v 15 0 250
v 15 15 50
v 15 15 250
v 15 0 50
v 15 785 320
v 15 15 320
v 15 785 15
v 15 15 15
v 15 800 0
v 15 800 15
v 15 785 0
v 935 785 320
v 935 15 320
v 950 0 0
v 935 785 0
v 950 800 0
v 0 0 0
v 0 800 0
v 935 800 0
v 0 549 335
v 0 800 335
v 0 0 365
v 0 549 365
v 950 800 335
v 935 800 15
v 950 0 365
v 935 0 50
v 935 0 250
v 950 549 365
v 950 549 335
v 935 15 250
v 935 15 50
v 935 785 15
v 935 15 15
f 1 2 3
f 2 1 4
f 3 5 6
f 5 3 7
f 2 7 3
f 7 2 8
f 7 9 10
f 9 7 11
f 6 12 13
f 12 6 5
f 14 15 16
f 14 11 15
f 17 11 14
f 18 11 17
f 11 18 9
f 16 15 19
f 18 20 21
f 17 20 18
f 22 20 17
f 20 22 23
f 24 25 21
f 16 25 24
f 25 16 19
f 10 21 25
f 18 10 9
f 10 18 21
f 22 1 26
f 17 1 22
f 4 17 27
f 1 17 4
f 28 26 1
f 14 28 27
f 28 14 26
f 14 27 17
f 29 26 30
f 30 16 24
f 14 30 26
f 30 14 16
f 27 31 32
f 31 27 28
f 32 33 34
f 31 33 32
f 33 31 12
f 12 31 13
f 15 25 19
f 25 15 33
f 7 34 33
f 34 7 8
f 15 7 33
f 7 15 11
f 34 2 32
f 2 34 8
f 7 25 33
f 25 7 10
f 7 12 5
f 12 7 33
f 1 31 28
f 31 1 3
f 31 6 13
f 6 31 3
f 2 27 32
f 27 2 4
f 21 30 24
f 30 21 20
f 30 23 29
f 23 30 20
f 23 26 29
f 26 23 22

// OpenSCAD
// Duster II Sleep Pack clone — v0.1 visualization
// Open in OpenSCAD. Set unfolded = true to see the bed deployed.
// Numbers match cad/params.py — if you change params.py, update these.

unfolded = false;

ply = 15;
box_w = 950;
box_d = 800;
box_h = 320;
inner_w = box_w - 2 * ply;
inner_d = box_d - 2 * ply;
inner_h = box_h - ply;
rail_top_h = 70;
rail_bot_h = 50;
table_w = inner_w - 2;
table_h = box_h - rail_top_h - rail_bot_h - 2;

p1 = 800;
p2 = 549;
p3 = 549;
deck_gap = 2;
bed_w = 950;
wing = 175;
wing_len = p2;
frame_rail_h = 80;
leg_h = inner_h;

module ply_xy(w, d) {
    cube([w, d, ply]);
}

module box() {
    // sides
    cube([ply, box_d, box_h]);
    translate([box_w - ply, 0, 0]) cube([ply, box_d, box_h]);
    // bottom
    translate([ply, ply, 0]) cube([inner_w, inner_d, ply]);
    // front (cabin)
    translate([ply, box_d - ply, ply]) cube([inner_w, ply, inner_h]);
    // rear rails
    translate([ply, 0, box_h - rail_top_h]) cube([inner_w, ply, rail_top_h]);
    translate([ply, 0, 0]) cube([inner_w, ply, rail_bot_h]);
}

module table_flap() {
    color("#c9b48a")
    translate([ply + 1, -table_h, rail_bot_h + 1])
        cube([table_w, ply, table_h]);
}

module deck_folded() {
    color("#c9b48a") {
        translate([0, 0, box_h]) ply_xy(bed_w, p1);
        translate([0, 0, box_h + ply]) ply_xy(bed_w, p2);
        translate([0, 0, box_h + 2 * ply]) ply_xy(bed_w, p3);
    }
}

module deck_open() {
    color("#c9b48a") {
        translate([0, 0, box_h]) ply_xy(bed_w, p1);
        translate([0, p1 + deck_gap, box_h]) ply_xy(bed_w, p2);
        translate([0, p1 + p2 + 2 * deck_gap, box_h]) ply_xy(bed_w, p3);
    }
    color("#b9d4c0") {
        translate([-wing, p1 + deck_gap, box_h]) ply_xy(wing, wing_len);
        translate([bed_w, p1 + deck_gap, box_h]) ply_xy(wing, wing_len);
    }
}

module frame_open() {
    color("#9aa7b5") {
        translate([ply, box_d, box_h - frame_rail_h])
            cube([ply, p2 + p3, frame_rail_h]);
        translate([box_w - 2 * ply, box_d, box_h - frame_rail_h])
            cube([ply, p2 + p3, frame_rail_h]);
        translate([2 * ply, box_d + 180, box_h - frame_rail_h])
            cube([inner_w - 2 * ply, ply, frame_rail_h]);
        translate([2 * ply, box_d + 180 + 400, box_h - frame_rail_h])
            cube([inner_w - 2 * ply, ply, frame_rail_h]);
        translate([ply, box_d + p2 + p3 - ply, 0])
            cube([ply, ply, leg_h]);
        translate([box_w - 2 * ply, box_d + p2 + p3 - ply, 0])
            cube([ply, ply, leg_h]);
    }
}

box();
if (unfolded) {
    table_flap();
    deck_open();
    frame_open();
} else {
    deck_folded();
}
